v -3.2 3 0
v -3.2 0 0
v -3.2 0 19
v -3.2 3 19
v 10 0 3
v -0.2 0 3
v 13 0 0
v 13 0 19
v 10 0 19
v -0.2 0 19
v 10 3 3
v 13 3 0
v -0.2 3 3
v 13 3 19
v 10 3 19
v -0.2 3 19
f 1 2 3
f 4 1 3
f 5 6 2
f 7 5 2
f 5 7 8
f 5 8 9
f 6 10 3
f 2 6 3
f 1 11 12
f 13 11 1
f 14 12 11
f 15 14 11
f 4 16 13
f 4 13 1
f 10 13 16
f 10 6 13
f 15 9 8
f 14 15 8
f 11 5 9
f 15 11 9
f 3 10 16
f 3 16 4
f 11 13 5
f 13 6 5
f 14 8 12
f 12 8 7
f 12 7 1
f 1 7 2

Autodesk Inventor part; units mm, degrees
ref_plane "YZ Plane" through (0, 0, 0) normal (1, 0, 0) x (0, 1, 0)
ref_plane "XZ Plane" through (0, 0, 0) normal (0, 1, 0) x (-1, 0, 0)
ref_plane "XY Plane" through (0, 0, 0) normal (0, 0, 1) x (1, 0, 0)
sketch "Sketch1" plane through (0, 0, 0) normal (0, 1, 0) x (-1, 0, 0)
  line L0 (-13, 0) -> (3.2, 0)
  line L1 (3.2, 0) -> (3.2, 3)
  line L2 (3.2, 3) -> (-13, 3)
  line L3 (-13, 3) -> (-13, 0)
  line L4 (-13, 3) -> (-10, 3)
  line L5 (-10, 3) -> (-10, 19)
  line L6 (-10, 19) -> (-13, 19)
  line L7 (-13, 19) -> (-13, 3)
  line L8 (3.2, 3) -> (0.2, 3)
  line L9 (0.2, 3) -> (0.2, 19)
  line L10 (0.2, 19) -> (3.2, 19)
  line L11 (3.2, 19) -> (3.2, 3)
  point P0 (0, 0)
  dimension "d0" = 16.2
  dimension "d1" = 3
  dimension "d2" = 3
  dimension "d3" = 16
  dimension "d4" = 3
  dimension "d5" = 16
extrude "Extrusion1" add sketch "Sketch1" along normal blind 3
